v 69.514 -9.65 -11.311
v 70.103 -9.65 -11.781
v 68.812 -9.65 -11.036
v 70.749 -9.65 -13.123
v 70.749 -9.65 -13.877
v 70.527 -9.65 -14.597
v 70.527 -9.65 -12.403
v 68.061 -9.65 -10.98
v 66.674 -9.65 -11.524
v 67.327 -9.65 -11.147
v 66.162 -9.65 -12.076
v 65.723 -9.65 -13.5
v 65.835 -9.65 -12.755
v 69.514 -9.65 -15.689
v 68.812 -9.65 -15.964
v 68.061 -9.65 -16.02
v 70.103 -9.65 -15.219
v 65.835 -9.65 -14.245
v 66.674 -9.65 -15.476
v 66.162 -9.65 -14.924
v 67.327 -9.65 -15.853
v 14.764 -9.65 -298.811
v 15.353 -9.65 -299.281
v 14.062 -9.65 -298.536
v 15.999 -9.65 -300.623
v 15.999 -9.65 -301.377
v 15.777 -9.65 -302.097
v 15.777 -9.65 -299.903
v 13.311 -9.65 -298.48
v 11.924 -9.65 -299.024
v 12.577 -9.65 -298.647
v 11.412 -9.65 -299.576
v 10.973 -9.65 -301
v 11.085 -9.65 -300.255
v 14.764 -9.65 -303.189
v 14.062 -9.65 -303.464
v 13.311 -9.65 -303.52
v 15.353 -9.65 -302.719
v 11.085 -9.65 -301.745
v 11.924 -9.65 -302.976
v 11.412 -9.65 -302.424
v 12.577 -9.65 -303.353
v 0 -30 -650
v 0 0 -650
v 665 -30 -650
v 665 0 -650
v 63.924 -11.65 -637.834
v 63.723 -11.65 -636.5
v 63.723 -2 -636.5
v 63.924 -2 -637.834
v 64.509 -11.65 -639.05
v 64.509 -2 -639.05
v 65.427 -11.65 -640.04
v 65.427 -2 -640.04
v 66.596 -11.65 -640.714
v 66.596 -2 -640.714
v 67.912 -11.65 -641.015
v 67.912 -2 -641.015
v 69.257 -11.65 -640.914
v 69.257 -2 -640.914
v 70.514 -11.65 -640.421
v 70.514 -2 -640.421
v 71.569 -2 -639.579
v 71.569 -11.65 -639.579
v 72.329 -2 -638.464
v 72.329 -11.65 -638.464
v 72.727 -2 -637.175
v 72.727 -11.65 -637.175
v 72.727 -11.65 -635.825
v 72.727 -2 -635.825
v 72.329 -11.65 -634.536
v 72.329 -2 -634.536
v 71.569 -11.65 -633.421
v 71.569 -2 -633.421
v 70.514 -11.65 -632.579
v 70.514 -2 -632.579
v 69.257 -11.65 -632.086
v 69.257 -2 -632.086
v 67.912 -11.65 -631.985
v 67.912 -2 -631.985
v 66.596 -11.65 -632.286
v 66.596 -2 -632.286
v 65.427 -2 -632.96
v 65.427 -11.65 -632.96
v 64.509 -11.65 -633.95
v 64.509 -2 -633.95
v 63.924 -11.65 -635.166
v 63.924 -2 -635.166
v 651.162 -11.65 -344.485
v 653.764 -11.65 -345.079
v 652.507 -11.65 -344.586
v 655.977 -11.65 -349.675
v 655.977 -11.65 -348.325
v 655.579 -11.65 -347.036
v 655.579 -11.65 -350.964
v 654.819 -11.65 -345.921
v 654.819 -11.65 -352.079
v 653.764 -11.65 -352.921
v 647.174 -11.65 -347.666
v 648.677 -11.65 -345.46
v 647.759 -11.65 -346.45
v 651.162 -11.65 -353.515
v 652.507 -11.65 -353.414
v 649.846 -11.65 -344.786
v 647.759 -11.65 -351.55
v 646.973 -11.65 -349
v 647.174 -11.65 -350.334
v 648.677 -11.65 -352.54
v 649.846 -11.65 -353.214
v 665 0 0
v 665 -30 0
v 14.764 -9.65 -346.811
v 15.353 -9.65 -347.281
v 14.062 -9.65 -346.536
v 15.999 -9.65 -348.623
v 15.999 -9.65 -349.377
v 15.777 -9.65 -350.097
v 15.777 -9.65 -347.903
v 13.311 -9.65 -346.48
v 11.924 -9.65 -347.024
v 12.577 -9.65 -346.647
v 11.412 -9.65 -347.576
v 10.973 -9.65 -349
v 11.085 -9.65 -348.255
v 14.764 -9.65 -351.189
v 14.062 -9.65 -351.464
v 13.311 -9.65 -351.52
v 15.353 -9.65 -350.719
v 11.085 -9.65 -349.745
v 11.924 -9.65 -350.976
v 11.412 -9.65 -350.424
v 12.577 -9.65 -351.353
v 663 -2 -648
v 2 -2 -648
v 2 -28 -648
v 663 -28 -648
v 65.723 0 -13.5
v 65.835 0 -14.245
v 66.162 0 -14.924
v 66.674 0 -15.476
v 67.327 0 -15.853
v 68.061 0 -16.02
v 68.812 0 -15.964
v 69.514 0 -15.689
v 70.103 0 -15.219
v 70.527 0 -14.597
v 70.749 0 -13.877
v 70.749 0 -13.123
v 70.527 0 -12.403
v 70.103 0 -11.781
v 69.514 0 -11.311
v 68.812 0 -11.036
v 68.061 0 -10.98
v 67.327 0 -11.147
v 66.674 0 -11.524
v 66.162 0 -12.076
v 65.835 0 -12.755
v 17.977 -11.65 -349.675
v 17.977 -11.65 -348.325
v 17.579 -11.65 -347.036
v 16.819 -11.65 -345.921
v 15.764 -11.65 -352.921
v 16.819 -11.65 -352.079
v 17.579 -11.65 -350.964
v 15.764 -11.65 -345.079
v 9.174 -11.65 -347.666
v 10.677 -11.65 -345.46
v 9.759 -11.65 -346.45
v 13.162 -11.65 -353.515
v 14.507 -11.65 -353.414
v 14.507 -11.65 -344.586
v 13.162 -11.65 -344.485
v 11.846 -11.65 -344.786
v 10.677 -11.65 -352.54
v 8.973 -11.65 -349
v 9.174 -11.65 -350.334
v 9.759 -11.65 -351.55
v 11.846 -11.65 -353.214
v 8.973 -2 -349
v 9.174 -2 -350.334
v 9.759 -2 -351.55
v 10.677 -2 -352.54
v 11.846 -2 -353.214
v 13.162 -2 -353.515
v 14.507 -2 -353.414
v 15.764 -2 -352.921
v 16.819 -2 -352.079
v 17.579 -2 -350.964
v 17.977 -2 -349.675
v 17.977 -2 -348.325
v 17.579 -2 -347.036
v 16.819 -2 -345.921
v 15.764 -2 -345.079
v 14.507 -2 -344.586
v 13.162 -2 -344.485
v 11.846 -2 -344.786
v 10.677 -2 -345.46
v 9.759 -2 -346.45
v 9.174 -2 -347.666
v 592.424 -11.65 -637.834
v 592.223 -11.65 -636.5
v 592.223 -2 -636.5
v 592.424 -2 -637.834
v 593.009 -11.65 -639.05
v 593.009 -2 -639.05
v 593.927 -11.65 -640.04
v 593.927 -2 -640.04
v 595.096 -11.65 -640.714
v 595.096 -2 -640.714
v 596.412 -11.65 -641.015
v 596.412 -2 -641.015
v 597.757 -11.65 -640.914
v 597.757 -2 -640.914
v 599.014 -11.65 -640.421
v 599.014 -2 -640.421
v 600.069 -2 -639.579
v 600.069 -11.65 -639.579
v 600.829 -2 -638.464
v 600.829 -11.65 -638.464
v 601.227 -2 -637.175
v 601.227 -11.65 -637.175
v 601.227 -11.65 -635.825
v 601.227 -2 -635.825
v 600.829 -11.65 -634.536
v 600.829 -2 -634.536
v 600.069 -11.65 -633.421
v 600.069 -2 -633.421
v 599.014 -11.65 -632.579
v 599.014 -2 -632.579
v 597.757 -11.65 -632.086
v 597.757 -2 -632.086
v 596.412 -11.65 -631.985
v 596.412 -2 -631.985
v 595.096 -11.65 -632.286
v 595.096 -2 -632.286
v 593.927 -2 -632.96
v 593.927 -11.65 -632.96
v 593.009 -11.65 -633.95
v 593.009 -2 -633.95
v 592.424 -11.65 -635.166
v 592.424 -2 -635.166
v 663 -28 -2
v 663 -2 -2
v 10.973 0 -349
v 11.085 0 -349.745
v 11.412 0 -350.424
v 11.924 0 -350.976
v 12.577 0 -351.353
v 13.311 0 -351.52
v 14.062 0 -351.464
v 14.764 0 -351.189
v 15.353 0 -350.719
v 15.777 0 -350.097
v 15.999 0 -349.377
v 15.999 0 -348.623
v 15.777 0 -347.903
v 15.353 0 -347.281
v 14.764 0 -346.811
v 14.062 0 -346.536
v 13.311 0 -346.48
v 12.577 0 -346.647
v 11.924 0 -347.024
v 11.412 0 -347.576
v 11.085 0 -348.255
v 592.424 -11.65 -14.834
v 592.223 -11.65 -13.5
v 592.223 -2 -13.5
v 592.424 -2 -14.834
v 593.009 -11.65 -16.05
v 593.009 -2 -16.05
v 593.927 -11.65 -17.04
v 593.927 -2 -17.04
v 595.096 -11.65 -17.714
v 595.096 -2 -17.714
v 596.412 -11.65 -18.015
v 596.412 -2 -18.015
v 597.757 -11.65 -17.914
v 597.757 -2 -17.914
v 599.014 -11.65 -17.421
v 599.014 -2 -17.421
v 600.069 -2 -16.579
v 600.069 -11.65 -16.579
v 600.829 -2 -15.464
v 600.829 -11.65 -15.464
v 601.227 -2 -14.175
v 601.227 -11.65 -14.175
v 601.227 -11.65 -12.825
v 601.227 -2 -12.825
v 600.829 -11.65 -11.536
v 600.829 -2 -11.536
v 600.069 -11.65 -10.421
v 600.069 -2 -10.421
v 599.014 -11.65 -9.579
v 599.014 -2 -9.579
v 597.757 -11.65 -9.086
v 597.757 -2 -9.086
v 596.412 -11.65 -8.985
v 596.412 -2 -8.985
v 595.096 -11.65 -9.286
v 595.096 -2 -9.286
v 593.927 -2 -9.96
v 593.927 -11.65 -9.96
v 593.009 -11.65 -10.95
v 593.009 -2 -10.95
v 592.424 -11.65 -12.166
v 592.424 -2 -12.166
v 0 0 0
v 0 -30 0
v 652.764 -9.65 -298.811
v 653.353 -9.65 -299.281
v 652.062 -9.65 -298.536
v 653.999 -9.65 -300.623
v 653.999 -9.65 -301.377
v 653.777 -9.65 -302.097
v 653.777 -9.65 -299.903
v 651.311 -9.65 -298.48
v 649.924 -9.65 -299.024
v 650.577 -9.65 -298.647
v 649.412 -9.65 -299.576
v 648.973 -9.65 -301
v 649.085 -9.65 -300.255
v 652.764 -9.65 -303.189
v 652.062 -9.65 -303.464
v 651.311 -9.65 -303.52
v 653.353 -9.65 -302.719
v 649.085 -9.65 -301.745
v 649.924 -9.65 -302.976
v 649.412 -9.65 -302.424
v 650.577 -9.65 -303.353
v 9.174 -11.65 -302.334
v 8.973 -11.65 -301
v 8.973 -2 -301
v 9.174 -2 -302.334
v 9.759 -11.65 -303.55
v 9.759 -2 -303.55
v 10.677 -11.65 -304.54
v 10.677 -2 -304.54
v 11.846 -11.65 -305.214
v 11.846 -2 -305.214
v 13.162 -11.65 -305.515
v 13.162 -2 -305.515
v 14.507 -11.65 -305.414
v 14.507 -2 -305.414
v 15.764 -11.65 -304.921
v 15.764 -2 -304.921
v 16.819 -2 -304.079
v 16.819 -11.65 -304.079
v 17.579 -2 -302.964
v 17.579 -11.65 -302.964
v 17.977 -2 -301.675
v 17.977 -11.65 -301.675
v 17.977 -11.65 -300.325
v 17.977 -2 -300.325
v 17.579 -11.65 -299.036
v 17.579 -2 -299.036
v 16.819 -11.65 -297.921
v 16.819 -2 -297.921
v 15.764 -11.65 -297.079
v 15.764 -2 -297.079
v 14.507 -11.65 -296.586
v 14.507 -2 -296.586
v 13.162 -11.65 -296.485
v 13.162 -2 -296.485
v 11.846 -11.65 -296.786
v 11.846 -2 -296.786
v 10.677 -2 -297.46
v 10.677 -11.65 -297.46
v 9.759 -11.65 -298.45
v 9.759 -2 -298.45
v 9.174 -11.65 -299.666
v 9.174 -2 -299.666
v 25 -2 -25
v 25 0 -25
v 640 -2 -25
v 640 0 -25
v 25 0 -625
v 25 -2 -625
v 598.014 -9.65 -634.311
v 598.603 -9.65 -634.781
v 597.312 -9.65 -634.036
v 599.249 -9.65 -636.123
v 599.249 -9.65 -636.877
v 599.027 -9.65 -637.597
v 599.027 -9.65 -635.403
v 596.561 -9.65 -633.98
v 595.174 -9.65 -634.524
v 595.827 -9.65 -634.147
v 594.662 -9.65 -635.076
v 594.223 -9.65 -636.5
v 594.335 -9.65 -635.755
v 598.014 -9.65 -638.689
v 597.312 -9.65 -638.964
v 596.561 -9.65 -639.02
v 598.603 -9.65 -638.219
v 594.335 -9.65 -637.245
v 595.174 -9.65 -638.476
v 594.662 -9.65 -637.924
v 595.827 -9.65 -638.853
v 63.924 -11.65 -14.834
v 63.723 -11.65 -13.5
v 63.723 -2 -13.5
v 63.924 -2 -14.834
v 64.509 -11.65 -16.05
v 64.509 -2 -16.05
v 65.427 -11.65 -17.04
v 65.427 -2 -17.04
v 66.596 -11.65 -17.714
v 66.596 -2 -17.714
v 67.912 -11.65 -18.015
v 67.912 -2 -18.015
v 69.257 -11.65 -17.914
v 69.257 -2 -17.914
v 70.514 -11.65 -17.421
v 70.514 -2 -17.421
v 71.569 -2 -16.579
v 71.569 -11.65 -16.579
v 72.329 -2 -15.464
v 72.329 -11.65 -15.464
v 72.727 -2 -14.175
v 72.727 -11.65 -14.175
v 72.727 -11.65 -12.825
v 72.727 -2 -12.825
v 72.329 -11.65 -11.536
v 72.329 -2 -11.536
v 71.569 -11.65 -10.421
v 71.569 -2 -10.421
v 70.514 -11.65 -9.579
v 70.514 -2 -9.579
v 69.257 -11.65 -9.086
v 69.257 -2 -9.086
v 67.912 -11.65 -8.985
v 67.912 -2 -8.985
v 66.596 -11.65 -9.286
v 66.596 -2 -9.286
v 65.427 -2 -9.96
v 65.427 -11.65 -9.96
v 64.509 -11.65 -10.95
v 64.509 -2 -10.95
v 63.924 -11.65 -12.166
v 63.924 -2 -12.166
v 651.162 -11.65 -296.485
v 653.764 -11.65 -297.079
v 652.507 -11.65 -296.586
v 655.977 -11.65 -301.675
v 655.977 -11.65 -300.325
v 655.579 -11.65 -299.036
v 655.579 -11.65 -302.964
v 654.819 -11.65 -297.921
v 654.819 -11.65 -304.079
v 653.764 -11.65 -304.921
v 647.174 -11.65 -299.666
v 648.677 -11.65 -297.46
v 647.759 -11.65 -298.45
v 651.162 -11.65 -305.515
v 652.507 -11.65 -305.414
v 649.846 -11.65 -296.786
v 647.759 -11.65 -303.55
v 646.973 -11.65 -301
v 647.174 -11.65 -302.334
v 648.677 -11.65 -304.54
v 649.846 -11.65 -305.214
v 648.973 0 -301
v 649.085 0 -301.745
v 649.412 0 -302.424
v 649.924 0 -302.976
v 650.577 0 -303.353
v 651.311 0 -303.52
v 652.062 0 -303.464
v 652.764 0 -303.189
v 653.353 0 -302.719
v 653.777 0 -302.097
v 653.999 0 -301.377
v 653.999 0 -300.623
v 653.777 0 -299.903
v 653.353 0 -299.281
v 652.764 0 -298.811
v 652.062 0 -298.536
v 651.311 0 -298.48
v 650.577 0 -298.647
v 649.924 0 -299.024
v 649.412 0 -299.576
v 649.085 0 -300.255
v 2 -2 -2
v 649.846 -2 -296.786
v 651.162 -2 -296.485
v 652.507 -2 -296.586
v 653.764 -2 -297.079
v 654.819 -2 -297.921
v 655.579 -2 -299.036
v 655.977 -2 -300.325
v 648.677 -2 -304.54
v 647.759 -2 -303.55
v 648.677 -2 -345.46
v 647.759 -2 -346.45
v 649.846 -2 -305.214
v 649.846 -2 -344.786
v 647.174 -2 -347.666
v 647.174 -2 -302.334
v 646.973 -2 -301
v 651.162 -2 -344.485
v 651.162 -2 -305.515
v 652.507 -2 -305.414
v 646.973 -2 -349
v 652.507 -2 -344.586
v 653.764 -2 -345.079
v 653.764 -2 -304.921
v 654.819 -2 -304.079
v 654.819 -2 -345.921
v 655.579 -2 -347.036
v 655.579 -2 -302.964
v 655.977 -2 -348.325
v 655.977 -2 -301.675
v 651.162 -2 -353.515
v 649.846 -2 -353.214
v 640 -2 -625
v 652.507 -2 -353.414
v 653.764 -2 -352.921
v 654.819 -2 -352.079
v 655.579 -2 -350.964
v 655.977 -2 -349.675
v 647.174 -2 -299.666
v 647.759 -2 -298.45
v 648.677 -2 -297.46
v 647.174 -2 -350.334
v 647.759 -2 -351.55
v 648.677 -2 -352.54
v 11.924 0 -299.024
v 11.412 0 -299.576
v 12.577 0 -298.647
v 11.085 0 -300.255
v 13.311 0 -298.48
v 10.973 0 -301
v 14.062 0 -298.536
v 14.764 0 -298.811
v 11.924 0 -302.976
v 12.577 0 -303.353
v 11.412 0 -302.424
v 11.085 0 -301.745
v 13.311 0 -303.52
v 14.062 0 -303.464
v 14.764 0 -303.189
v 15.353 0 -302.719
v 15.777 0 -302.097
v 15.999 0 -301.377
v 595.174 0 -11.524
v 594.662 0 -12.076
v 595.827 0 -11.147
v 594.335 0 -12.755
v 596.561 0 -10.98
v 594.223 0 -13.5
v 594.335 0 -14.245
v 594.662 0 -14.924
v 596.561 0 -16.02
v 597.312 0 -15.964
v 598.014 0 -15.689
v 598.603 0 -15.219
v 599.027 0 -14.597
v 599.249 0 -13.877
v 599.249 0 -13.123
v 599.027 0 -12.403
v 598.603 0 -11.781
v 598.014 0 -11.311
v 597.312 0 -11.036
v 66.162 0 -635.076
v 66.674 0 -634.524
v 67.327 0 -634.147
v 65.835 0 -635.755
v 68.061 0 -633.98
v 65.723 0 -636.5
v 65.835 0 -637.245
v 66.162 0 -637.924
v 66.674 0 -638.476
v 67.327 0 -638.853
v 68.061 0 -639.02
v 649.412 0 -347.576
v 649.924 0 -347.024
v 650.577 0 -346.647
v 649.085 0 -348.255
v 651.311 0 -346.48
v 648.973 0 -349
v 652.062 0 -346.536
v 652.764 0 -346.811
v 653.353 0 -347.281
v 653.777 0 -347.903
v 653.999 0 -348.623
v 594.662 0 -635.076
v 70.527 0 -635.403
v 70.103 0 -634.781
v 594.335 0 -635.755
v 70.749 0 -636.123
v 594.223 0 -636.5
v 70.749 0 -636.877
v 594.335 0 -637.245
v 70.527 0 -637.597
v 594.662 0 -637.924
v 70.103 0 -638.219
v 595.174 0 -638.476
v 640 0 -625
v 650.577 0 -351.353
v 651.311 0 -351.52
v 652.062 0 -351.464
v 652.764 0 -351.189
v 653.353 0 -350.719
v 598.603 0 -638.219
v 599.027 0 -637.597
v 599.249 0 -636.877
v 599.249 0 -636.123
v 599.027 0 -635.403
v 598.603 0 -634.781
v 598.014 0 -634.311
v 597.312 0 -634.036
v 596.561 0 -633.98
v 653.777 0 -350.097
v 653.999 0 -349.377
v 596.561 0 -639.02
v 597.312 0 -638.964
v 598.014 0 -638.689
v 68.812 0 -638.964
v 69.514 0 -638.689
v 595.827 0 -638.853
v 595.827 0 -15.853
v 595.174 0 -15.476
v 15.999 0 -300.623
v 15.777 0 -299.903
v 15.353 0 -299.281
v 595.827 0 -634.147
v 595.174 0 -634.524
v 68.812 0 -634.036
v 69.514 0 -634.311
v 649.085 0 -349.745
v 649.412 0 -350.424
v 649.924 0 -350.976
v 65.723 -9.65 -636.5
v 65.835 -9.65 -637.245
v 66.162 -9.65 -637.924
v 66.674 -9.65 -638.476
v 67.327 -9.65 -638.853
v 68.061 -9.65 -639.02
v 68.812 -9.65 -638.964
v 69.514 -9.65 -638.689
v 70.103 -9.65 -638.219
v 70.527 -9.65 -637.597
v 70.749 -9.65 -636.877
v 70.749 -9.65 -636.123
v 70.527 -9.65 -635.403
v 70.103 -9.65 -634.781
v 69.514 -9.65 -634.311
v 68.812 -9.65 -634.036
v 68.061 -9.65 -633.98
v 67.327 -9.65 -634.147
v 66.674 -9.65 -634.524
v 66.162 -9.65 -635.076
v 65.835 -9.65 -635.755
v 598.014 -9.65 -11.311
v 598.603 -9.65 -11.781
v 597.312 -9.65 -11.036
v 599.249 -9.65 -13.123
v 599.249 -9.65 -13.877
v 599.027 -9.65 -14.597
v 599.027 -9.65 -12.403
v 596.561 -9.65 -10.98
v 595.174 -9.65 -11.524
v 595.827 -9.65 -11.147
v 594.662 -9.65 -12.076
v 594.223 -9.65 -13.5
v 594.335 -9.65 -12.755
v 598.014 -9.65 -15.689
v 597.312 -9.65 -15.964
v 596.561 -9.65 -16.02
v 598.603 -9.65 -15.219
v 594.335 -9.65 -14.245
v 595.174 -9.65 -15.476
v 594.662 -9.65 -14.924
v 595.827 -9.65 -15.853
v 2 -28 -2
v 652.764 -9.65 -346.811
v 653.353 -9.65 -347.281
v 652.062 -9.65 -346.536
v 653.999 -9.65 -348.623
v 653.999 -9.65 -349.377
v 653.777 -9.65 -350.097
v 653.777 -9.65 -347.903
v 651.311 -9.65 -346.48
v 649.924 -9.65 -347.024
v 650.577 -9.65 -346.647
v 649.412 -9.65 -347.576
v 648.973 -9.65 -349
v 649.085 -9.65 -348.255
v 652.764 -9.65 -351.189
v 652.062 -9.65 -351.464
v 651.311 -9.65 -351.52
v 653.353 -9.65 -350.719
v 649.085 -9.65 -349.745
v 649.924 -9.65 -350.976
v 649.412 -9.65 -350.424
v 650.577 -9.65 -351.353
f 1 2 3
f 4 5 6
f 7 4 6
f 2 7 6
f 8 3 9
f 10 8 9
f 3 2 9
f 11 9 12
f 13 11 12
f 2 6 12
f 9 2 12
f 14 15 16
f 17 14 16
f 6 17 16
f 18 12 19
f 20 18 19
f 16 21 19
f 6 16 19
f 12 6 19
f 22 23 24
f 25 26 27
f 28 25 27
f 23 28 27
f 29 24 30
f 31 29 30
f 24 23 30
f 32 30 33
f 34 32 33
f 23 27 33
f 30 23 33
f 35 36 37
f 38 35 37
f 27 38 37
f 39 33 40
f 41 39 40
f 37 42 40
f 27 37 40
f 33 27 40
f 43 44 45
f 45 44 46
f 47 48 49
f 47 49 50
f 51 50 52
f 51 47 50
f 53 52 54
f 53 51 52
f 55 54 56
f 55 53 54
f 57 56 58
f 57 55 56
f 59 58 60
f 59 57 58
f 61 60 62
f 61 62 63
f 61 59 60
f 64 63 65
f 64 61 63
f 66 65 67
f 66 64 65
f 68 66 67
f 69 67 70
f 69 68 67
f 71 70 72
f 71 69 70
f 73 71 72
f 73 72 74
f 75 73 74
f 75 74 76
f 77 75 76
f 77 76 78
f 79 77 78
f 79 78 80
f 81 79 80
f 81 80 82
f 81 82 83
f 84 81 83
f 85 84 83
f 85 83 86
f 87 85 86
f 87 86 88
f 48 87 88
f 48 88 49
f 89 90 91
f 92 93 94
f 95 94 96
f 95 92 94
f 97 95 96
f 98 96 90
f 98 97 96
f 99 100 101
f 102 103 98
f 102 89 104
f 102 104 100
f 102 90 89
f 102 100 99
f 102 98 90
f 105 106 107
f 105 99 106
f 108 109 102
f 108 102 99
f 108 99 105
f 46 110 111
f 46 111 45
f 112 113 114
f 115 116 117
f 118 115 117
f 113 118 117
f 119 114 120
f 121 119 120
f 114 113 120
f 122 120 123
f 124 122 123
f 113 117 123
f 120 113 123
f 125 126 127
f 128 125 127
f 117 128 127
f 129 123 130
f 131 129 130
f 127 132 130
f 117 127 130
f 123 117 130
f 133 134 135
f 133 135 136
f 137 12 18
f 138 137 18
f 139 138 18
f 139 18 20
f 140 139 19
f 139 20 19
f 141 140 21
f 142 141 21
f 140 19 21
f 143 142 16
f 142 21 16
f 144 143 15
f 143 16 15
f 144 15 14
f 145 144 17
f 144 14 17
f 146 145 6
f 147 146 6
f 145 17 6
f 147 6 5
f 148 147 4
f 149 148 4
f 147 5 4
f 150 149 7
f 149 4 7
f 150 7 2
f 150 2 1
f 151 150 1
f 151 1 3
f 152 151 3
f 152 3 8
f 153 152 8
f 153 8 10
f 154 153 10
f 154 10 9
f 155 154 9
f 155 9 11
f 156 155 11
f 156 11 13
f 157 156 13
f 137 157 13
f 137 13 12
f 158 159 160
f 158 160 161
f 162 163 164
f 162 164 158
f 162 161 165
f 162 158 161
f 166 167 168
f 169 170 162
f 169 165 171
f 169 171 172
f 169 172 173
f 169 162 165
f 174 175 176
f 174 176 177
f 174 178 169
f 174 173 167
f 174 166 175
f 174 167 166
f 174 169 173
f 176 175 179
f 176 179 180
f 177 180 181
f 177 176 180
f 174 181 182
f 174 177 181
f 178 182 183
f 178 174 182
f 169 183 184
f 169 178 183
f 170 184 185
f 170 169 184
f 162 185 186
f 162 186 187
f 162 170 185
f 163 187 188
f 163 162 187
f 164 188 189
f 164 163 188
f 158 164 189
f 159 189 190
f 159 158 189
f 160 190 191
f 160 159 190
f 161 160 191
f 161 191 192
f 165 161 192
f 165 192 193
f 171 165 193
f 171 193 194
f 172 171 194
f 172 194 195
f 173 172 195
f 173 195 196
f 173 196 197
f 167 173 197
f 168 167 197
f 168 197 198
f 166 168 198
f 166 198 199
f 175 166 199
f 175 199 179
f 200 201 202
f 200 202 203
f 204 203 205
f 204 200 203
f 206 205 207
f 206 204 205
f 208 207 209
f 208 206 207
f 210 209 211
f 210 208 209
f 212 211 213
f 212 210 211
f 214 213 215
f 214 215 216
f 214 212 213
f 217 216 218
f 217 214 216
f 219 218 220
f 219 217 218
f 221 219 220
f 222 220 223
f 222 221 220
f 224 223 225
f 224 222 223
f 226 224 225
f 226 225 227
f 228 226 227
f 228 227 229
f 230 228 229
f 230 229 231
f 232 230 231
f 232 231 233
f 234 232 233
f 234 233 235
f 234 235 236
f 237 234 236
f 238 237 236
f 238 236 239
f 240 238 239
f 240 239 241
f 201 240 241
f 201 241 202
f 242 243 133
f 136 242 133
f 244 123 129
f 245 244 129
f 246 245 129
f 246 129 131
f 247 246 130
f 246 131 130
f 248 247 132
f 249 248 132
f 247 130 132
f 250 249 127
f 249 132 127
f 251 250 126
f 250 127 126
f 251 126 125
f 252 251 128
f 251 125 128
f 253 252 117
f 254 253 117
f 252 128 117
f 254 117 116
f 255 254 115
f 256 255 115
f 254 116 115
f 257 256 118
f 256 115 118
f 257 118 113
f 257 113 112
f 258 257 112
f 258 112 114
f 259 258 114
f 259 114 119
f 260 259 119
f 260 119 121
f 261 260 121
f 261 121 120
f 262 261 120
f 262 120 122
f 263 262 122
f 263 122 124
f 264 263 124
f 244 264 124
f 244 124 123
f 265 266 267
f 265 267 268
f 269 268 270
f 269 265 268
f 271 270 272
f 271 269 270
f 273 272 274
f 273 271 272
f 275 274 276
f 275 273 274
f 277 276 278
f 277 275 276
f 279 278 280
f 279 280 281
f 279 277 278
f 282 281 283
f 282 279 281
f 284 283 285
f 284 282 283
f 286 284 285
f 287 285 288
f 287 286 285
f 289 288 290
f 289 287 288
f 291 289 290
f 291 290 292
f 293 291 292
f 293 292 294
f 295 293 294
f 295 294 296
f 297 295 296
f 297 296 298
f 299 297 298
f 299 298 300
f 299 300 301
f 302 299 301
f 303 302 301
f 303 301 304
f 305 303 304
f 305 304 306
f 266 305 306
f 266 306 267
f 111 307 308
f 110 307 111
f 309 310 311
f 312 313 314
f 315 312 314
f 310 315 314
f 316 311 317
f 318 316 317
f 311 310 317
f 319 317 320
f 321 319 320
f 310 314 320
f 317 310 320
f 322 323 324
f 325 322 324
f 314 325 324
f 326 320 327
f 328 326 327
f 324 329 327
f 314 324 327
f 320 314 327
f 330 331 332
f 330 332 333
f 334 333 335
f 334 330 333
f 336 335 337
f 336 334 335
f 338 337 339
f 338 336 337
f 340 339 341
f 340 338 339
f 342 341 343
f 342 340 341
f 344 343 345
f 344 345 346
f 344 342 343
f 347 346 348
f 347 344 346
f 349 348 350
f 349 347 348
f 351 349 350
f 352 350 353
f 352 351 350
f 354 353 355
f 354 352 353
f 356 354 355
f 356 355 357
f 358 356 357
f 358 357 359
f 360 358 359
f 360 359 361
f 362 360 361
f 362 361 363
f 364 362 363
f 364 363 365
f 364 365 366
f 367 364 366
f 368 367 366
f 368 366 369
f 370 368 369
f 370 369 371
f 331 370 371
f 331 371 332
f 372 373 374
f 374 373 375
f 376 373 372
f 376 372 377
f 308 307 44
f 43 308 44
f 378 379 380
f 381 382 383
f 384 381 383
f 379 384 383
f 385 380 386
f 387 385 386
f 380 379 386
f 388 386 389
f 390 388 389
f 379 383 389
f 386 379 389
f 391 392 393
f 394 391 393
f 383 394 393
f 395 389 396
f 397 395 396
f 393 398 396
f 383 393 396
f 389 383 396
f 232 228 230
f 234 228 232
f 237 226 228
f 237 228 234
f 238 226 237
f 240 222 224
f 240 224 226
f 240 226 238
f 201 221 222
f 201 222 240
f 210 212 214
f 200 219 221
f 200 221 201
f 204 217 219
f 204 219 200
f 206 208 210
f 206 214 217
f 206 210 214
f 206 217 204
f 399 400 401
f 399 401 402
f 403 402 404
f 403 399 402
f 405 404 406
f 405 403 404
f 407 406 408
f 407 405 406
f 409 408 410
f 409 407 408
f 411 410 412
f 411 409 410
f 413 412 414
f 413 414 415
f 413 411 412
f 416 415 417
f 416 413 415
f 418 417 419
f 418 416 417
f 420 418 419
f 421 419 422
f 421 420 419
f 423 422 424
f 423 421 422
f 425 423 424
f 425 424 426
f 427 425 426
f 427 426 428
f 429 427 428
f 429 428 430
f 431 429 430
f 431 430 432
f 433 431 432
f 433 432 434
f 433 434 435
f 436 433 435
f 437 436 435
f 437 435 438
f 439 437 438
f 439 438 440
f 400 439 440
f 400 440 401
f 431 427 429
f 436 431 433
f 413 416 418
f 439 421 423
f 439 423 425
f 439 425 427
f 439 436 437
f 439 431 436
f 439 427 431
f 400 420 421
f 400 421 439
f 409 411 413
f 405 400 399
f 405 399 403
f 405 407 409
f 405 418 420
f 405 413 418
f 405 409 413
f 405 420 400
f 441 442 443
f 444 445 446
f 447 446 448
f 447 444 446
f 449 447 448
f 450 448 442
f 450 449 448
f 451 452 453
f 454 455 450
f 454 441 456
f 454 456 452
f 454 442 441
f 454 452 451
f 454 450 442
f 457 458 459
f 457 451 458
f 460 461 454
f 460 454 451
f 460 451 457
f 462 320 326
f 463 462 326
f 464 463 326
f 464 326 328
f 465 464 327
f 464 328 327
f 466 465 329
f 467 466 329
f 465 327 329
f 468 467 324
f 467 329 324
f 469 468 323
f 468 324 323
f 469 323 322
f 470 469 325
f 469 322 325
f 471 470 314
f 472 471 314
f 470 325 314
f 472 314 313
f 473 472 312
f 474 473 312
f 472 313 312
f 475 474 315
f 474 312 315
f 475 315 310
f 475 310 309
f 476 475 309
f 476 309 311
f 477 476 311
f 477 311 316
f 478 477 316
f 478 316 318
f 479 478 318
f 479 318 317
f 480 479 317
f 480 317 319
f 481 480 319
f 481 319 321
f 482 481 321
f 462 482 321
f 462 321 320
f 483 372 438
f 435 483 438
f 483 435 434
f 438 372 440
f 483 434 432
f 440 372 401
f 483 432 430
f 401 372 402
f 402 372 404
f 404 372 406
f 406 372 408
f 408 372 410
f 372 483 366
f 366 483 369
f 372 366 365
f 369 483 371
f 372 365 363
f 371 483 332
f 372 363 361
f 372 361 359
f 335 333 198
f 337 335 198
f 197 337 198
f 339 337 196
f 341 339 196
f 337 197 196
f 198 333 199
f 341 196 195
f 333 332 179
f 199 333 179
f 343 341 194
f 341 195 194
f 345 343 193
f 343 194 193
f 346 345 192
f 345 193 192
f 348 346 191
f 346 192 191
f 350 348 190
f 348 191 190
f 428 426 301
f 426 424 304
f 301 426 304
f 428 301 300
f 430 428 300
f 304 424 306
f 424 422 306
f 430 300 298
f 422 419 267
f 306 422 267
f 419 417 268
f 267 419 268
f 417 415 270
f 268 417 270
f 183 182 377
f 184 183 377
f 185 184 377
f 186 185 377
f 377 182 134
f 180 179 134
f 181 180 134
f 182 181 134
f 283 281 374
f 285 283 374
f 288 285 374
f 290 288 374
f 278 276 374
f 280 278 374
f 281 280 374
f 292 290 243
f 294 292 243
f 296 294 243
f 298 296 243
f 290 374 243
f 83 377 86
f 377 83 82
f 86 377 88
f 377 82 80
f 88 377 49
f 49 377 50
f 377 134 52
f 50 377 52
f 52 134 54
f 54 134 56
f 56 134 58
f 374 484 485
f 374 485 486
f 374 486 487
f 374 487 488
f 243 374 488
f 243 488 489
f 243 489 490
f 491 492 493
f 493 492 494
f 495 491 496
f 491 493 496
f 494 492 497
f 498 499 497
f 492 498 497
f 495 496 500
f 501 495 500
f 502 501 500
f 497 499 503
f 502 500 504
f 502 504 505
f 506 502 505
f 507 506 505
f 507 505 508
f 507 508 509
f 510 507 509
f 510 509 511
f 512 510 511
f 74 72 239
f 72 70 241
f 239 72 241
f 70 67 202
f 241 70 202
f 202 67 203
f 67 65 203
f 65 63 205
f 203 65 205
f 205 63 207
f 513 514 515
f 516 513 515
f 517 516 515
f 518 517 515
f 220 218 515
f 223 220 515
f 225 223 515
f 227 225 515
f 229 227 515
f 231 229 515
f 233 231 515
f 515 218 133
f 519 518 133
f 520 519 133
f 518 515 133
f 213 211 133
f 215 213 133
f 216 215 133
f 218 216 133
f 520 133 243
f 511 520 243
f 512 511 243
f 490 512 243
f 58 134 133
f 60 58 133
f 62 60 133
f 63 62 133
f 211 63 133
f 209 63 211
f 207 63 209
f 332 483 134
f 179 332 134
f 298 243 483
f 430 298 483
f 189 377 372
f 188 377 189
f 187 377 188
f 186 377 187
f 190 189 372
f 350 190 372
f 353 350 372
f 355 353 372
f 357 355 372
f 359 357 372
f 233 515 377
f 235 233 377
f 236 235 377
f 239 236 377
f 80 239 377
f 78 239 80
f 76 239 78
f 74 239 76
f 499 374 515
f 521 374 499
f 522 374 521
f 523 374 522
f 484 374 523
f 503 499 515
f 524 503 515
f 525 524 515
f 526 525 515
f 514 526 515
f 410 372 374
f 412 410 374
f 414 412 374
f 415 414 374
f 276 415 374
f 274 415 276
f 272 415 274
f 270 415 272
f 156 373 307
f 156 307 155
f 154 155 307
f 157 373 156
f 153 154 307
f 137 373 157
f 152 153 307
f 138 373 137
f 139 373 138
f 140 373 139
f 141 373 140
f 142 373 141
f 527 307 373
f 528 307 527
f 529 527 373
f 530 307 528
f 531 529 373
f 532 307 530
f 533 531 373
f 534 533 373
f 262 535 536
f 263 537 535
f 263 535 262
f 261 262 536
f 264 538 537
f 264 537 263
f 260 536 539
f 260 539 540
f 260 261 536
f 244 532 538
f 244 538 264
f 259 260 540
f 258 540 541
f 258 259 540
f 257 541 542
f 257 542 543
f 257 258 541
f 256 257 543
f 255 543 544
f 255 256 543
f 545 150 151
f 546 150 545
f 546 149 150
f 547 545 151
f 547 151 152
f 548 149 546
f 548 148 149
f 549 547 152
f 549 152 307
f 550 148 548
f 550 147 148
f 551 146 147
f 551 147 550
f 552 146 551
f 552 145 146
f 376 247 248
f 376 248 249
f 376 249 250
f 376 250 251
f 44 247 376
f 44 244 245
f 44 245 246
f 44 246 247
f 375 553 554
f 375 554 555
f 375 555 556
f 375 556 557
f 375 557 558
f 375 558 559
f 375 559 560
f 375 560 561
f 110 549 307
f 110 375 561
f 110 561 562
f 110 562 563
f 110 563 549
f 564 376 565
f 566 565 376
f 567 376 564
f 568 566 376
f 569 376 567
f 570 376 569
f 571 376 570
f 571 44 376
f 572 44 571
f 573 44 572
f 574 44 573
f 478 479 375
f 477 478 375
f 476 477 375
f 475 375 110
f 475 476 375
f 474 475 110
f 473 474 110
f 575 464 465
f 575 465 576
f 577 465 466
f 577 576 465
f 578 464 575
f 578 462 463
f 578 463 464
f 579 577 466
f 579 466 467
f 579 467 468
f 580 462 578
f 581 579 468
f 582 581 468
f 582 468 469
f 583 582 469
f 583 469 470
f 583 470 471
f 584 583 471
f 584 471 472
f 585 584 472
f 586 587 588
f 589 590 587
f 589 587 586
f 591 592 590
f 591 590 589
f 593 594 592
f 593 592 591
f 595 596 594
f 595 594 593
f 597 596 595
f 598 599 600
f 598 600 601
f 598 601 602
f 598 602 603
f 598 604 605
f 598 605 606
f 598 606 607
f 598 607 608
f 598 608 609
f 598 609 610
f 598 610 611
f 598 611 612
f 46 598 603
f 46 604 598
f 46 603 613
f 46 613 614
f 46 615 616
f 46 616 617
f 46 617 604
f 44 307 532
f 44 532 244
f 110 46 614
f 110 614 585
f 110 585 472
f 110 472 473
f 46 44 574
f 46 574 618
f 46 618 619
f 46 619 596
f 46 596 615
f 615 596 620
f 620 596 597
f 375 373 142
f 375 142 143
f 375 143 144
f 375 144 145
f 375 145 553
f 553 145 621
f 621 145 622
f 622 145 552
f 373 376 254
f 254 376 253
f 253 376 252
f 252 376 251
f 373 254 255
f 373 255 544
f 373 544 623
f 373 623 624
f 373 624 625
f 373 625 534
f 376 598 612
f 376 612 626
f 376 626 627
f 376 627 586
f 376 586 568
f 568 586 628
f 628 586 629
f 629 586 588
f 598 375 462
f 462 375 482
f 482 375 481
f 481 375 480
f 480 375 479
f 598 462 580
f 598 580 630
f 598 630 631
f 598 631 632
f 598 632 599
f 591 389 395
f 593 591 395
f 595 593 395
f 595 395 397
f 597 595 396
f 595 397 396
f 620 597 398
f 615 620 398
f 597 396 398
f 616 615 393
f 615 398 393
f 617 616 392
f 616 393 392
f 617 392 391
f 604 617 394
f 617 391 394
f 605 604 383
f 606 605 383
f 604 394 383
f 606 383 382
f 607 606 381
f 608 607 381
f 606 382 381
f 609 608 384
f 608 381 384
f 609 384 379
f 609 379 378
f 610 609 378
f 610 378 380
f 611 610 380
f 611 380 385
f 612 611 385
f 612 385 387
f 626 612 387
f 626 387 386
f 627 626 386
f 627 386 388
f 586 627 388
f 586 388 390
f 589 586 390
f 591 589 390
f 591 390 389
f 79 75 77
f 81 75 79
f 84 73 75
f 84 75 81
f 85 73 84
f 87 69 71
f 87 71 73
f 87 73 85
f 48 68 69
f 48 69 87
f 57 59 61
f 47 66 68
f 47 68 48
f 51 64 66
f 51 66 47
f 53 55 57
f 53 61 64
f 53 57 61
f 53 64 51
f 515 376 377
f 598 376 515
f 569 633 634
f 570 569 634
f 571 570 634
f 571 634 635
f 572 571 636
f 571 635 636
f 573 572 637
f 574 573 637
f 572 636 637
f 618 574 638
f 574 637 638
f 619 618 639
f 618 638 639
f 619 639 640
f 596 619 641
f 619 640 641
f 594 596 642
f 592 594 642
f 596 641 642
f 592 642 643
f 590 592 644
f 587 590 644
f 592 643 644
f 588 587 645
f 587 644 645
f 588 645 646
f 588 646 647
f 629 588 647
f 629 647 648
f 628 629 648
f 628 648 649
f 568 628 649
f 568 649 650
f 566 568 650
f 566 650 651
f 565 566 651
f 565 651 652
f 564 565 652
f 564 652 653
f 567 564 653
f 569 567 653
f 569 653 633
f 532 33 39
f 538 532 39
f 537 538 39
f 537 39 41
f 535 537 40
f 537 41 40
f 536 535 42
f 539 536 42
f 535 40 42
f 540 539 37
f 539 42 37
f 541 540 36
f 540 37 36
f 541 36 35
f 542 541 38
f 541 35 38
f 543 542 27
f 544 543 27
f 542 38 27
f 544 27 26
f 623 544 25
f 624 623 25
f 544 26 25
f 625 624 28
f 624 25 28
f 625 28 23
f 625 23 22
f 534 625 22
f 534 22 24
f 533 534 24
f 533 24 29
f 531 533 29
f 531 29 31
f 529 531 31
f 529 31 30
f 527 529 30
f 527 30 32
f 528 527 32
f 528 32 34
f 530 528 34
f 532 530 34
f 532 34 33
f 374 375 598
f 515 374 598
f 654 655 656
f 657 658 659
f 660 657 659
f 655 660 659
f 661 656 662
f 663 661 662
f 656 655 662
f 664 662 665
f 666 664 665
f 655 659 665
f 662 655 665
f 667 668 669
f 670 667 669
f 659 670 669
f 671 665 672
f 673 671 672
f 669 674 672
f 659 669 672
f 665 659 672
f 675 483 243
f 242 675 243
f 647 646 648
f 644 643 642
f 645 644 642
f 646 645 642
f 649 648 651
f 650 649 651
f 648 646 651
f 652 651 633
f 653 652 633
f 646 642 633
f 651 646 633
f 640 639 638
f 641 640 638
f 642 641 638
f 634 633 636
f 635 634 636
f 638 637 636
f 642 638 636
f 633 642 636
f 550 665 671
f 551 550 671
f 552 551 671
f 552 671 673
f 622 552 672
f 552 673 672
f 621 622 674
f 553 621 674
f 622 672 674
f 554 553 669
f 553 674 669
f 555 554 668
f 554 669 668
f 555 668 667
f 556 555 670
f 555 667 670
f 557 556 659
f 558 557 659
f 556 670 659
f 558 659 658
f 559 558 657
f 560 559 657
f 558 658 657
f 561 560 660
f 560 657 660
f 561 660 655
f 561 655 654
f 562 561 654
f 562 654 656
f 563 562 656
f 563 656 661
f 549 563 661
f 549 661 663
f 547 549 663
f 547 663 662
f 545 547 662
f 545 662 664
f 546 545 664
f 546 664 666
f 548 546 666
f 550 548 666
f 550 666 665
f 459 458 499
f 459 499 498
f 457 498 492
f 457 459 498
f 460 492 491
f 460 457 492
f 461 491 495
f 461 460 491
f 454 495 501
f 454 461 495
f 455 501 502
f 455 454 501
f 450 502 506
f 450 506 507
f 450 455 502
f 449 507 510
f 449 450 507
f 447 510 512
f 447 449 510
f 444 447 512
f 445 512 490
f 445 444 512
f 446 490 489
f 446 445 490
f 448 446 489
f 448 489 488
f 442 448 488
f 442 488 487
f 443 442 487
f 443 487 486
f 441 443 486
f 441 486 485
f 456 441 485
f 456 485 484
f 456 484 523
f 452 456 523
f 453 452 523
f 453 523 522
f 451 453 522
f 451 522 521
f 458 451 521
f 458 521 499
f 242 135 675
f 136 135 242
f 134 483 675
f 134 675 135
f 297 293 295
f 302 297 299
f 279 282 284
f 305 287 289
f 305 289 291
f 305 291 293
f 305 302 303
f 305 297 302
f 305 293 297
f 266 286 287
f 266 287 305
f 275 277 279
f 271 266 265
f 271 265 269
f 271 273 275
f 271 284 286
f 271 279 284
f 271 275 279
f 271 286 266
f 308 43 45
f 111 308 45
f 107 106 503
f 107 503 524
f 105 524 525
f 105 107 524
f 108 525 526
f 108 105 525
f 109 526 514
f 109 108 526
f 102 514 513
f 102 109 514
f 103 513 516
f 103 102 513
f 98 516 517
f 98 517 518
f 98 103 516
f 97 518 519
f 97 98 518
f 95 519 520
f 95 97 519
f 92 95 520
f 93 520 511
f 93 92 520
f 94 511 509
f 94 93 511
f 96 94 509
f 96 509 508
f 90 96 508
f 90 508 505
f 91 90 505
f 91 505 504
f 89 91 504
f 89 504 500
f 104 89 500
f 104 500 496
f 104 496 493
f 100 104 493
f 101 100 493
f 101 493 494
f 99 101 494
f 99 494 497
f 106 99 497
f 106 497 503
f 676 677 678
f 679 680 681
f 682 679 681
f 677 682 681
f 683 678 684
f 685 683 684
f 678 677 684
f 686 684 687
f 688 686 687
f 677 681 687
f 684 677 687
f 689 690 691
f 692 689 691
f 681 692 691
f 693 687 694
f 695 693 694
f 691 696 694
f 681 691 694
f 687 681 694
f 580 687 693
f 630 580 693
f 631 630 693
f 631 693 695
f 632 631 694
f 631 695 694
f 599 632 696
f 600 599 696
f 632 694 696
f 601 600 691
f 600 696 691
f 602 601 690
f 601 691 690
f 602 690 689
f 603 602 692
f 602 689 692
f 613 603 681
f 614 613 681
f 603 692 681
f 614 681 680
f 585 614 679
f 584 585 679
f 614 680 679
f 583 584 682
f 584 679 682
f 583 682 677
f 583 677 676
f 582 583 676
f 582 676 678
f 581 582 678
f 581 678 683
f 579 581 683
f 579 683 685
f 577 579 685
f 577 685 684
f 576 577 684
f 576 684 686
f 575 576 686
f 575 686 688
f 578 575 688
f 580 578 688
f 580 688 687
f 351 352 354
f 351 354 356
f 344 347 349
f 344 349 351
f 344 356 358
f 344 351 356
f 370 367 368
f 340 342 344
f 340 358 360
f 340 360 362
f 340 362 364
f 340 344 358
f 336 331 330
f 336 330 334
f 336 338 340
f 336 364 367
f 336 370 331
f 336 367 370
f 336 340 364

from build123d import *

# Parameters (mm, degrees)
SKETCH1_W                      = 665
SKETCH1_H                      = 650
BOSS_EXTRUDE1_DEPTH            = 30
F_8_0_199_DIAMETER_HOLE1_D     = 5.0546
F_8_0_199_DIAMETER_HOLE1_DEPTH = 9.65
SKETCH4_W                      = 615
SKETCH4_H                      = 600
CUT_EXTRUDE1_DEPTH             = 20
SHELL_T                        = -2


with BuildPart() as part:
    # Sketch1 → Boss-Extrude1 (new body)
    with BuildSketch(Plane(origin=(0, 0, 0), x_dir=(1, 0, 0), z_dir=(0, 1, 0))):
        with Locations((332.5, 325)):
            Rectangle(SKETCH1_W, SKETCH1_H)
    extrude(amount=-BOSS_EXTRUDE1_DEPTH)

    # #8 (0.199) Diameter Hole1
    with Locations(Plane(origin=(0, 0, 0), x_dir=(1, 0, 0), z_dir=(0, 1, 0))):
        with Locations((68.25, 13.5), (13.5, 301), (596.75, 13.5), (651.5, 301), (651.5, 349), (596.75, 636.5), (68.25, 636.5), (13.5, 349)):
            Hole(F_8_0_199_DIAMETER_HOLE1_D / 2, depth=F_8_0_199_DIAMETER_HOLE1_DEPTH)

    # Sketch4 → Cut-Extrude1 (cut)
    with BuildSketch(Plane(origin=(0, 0, 0), x_dir=(1, 0, 0), z_dir=(0, 1, 0))):
        with Locations((332.5, 325)):
            Rectangle(SKETCH4_W, SKETCH4_H)
    extrude(amount=-CUT_EXTRUDE1_DEPTH, mode=Mode.SUBTRACT)

    # Shell
    shell_openings = [part.faces().sort_by_distance(p)[0] for p in [
        (25, -10, -325),
        (332.5, -10, -25),
        (640, -10, -325),
        (332.5, -10, -625),
        (332.5, -20, -325),
    ]]
    offset(amount=SHELL_T, openings=shell_openings, kind=Kind.INTERSECTION)


solid = part.part
